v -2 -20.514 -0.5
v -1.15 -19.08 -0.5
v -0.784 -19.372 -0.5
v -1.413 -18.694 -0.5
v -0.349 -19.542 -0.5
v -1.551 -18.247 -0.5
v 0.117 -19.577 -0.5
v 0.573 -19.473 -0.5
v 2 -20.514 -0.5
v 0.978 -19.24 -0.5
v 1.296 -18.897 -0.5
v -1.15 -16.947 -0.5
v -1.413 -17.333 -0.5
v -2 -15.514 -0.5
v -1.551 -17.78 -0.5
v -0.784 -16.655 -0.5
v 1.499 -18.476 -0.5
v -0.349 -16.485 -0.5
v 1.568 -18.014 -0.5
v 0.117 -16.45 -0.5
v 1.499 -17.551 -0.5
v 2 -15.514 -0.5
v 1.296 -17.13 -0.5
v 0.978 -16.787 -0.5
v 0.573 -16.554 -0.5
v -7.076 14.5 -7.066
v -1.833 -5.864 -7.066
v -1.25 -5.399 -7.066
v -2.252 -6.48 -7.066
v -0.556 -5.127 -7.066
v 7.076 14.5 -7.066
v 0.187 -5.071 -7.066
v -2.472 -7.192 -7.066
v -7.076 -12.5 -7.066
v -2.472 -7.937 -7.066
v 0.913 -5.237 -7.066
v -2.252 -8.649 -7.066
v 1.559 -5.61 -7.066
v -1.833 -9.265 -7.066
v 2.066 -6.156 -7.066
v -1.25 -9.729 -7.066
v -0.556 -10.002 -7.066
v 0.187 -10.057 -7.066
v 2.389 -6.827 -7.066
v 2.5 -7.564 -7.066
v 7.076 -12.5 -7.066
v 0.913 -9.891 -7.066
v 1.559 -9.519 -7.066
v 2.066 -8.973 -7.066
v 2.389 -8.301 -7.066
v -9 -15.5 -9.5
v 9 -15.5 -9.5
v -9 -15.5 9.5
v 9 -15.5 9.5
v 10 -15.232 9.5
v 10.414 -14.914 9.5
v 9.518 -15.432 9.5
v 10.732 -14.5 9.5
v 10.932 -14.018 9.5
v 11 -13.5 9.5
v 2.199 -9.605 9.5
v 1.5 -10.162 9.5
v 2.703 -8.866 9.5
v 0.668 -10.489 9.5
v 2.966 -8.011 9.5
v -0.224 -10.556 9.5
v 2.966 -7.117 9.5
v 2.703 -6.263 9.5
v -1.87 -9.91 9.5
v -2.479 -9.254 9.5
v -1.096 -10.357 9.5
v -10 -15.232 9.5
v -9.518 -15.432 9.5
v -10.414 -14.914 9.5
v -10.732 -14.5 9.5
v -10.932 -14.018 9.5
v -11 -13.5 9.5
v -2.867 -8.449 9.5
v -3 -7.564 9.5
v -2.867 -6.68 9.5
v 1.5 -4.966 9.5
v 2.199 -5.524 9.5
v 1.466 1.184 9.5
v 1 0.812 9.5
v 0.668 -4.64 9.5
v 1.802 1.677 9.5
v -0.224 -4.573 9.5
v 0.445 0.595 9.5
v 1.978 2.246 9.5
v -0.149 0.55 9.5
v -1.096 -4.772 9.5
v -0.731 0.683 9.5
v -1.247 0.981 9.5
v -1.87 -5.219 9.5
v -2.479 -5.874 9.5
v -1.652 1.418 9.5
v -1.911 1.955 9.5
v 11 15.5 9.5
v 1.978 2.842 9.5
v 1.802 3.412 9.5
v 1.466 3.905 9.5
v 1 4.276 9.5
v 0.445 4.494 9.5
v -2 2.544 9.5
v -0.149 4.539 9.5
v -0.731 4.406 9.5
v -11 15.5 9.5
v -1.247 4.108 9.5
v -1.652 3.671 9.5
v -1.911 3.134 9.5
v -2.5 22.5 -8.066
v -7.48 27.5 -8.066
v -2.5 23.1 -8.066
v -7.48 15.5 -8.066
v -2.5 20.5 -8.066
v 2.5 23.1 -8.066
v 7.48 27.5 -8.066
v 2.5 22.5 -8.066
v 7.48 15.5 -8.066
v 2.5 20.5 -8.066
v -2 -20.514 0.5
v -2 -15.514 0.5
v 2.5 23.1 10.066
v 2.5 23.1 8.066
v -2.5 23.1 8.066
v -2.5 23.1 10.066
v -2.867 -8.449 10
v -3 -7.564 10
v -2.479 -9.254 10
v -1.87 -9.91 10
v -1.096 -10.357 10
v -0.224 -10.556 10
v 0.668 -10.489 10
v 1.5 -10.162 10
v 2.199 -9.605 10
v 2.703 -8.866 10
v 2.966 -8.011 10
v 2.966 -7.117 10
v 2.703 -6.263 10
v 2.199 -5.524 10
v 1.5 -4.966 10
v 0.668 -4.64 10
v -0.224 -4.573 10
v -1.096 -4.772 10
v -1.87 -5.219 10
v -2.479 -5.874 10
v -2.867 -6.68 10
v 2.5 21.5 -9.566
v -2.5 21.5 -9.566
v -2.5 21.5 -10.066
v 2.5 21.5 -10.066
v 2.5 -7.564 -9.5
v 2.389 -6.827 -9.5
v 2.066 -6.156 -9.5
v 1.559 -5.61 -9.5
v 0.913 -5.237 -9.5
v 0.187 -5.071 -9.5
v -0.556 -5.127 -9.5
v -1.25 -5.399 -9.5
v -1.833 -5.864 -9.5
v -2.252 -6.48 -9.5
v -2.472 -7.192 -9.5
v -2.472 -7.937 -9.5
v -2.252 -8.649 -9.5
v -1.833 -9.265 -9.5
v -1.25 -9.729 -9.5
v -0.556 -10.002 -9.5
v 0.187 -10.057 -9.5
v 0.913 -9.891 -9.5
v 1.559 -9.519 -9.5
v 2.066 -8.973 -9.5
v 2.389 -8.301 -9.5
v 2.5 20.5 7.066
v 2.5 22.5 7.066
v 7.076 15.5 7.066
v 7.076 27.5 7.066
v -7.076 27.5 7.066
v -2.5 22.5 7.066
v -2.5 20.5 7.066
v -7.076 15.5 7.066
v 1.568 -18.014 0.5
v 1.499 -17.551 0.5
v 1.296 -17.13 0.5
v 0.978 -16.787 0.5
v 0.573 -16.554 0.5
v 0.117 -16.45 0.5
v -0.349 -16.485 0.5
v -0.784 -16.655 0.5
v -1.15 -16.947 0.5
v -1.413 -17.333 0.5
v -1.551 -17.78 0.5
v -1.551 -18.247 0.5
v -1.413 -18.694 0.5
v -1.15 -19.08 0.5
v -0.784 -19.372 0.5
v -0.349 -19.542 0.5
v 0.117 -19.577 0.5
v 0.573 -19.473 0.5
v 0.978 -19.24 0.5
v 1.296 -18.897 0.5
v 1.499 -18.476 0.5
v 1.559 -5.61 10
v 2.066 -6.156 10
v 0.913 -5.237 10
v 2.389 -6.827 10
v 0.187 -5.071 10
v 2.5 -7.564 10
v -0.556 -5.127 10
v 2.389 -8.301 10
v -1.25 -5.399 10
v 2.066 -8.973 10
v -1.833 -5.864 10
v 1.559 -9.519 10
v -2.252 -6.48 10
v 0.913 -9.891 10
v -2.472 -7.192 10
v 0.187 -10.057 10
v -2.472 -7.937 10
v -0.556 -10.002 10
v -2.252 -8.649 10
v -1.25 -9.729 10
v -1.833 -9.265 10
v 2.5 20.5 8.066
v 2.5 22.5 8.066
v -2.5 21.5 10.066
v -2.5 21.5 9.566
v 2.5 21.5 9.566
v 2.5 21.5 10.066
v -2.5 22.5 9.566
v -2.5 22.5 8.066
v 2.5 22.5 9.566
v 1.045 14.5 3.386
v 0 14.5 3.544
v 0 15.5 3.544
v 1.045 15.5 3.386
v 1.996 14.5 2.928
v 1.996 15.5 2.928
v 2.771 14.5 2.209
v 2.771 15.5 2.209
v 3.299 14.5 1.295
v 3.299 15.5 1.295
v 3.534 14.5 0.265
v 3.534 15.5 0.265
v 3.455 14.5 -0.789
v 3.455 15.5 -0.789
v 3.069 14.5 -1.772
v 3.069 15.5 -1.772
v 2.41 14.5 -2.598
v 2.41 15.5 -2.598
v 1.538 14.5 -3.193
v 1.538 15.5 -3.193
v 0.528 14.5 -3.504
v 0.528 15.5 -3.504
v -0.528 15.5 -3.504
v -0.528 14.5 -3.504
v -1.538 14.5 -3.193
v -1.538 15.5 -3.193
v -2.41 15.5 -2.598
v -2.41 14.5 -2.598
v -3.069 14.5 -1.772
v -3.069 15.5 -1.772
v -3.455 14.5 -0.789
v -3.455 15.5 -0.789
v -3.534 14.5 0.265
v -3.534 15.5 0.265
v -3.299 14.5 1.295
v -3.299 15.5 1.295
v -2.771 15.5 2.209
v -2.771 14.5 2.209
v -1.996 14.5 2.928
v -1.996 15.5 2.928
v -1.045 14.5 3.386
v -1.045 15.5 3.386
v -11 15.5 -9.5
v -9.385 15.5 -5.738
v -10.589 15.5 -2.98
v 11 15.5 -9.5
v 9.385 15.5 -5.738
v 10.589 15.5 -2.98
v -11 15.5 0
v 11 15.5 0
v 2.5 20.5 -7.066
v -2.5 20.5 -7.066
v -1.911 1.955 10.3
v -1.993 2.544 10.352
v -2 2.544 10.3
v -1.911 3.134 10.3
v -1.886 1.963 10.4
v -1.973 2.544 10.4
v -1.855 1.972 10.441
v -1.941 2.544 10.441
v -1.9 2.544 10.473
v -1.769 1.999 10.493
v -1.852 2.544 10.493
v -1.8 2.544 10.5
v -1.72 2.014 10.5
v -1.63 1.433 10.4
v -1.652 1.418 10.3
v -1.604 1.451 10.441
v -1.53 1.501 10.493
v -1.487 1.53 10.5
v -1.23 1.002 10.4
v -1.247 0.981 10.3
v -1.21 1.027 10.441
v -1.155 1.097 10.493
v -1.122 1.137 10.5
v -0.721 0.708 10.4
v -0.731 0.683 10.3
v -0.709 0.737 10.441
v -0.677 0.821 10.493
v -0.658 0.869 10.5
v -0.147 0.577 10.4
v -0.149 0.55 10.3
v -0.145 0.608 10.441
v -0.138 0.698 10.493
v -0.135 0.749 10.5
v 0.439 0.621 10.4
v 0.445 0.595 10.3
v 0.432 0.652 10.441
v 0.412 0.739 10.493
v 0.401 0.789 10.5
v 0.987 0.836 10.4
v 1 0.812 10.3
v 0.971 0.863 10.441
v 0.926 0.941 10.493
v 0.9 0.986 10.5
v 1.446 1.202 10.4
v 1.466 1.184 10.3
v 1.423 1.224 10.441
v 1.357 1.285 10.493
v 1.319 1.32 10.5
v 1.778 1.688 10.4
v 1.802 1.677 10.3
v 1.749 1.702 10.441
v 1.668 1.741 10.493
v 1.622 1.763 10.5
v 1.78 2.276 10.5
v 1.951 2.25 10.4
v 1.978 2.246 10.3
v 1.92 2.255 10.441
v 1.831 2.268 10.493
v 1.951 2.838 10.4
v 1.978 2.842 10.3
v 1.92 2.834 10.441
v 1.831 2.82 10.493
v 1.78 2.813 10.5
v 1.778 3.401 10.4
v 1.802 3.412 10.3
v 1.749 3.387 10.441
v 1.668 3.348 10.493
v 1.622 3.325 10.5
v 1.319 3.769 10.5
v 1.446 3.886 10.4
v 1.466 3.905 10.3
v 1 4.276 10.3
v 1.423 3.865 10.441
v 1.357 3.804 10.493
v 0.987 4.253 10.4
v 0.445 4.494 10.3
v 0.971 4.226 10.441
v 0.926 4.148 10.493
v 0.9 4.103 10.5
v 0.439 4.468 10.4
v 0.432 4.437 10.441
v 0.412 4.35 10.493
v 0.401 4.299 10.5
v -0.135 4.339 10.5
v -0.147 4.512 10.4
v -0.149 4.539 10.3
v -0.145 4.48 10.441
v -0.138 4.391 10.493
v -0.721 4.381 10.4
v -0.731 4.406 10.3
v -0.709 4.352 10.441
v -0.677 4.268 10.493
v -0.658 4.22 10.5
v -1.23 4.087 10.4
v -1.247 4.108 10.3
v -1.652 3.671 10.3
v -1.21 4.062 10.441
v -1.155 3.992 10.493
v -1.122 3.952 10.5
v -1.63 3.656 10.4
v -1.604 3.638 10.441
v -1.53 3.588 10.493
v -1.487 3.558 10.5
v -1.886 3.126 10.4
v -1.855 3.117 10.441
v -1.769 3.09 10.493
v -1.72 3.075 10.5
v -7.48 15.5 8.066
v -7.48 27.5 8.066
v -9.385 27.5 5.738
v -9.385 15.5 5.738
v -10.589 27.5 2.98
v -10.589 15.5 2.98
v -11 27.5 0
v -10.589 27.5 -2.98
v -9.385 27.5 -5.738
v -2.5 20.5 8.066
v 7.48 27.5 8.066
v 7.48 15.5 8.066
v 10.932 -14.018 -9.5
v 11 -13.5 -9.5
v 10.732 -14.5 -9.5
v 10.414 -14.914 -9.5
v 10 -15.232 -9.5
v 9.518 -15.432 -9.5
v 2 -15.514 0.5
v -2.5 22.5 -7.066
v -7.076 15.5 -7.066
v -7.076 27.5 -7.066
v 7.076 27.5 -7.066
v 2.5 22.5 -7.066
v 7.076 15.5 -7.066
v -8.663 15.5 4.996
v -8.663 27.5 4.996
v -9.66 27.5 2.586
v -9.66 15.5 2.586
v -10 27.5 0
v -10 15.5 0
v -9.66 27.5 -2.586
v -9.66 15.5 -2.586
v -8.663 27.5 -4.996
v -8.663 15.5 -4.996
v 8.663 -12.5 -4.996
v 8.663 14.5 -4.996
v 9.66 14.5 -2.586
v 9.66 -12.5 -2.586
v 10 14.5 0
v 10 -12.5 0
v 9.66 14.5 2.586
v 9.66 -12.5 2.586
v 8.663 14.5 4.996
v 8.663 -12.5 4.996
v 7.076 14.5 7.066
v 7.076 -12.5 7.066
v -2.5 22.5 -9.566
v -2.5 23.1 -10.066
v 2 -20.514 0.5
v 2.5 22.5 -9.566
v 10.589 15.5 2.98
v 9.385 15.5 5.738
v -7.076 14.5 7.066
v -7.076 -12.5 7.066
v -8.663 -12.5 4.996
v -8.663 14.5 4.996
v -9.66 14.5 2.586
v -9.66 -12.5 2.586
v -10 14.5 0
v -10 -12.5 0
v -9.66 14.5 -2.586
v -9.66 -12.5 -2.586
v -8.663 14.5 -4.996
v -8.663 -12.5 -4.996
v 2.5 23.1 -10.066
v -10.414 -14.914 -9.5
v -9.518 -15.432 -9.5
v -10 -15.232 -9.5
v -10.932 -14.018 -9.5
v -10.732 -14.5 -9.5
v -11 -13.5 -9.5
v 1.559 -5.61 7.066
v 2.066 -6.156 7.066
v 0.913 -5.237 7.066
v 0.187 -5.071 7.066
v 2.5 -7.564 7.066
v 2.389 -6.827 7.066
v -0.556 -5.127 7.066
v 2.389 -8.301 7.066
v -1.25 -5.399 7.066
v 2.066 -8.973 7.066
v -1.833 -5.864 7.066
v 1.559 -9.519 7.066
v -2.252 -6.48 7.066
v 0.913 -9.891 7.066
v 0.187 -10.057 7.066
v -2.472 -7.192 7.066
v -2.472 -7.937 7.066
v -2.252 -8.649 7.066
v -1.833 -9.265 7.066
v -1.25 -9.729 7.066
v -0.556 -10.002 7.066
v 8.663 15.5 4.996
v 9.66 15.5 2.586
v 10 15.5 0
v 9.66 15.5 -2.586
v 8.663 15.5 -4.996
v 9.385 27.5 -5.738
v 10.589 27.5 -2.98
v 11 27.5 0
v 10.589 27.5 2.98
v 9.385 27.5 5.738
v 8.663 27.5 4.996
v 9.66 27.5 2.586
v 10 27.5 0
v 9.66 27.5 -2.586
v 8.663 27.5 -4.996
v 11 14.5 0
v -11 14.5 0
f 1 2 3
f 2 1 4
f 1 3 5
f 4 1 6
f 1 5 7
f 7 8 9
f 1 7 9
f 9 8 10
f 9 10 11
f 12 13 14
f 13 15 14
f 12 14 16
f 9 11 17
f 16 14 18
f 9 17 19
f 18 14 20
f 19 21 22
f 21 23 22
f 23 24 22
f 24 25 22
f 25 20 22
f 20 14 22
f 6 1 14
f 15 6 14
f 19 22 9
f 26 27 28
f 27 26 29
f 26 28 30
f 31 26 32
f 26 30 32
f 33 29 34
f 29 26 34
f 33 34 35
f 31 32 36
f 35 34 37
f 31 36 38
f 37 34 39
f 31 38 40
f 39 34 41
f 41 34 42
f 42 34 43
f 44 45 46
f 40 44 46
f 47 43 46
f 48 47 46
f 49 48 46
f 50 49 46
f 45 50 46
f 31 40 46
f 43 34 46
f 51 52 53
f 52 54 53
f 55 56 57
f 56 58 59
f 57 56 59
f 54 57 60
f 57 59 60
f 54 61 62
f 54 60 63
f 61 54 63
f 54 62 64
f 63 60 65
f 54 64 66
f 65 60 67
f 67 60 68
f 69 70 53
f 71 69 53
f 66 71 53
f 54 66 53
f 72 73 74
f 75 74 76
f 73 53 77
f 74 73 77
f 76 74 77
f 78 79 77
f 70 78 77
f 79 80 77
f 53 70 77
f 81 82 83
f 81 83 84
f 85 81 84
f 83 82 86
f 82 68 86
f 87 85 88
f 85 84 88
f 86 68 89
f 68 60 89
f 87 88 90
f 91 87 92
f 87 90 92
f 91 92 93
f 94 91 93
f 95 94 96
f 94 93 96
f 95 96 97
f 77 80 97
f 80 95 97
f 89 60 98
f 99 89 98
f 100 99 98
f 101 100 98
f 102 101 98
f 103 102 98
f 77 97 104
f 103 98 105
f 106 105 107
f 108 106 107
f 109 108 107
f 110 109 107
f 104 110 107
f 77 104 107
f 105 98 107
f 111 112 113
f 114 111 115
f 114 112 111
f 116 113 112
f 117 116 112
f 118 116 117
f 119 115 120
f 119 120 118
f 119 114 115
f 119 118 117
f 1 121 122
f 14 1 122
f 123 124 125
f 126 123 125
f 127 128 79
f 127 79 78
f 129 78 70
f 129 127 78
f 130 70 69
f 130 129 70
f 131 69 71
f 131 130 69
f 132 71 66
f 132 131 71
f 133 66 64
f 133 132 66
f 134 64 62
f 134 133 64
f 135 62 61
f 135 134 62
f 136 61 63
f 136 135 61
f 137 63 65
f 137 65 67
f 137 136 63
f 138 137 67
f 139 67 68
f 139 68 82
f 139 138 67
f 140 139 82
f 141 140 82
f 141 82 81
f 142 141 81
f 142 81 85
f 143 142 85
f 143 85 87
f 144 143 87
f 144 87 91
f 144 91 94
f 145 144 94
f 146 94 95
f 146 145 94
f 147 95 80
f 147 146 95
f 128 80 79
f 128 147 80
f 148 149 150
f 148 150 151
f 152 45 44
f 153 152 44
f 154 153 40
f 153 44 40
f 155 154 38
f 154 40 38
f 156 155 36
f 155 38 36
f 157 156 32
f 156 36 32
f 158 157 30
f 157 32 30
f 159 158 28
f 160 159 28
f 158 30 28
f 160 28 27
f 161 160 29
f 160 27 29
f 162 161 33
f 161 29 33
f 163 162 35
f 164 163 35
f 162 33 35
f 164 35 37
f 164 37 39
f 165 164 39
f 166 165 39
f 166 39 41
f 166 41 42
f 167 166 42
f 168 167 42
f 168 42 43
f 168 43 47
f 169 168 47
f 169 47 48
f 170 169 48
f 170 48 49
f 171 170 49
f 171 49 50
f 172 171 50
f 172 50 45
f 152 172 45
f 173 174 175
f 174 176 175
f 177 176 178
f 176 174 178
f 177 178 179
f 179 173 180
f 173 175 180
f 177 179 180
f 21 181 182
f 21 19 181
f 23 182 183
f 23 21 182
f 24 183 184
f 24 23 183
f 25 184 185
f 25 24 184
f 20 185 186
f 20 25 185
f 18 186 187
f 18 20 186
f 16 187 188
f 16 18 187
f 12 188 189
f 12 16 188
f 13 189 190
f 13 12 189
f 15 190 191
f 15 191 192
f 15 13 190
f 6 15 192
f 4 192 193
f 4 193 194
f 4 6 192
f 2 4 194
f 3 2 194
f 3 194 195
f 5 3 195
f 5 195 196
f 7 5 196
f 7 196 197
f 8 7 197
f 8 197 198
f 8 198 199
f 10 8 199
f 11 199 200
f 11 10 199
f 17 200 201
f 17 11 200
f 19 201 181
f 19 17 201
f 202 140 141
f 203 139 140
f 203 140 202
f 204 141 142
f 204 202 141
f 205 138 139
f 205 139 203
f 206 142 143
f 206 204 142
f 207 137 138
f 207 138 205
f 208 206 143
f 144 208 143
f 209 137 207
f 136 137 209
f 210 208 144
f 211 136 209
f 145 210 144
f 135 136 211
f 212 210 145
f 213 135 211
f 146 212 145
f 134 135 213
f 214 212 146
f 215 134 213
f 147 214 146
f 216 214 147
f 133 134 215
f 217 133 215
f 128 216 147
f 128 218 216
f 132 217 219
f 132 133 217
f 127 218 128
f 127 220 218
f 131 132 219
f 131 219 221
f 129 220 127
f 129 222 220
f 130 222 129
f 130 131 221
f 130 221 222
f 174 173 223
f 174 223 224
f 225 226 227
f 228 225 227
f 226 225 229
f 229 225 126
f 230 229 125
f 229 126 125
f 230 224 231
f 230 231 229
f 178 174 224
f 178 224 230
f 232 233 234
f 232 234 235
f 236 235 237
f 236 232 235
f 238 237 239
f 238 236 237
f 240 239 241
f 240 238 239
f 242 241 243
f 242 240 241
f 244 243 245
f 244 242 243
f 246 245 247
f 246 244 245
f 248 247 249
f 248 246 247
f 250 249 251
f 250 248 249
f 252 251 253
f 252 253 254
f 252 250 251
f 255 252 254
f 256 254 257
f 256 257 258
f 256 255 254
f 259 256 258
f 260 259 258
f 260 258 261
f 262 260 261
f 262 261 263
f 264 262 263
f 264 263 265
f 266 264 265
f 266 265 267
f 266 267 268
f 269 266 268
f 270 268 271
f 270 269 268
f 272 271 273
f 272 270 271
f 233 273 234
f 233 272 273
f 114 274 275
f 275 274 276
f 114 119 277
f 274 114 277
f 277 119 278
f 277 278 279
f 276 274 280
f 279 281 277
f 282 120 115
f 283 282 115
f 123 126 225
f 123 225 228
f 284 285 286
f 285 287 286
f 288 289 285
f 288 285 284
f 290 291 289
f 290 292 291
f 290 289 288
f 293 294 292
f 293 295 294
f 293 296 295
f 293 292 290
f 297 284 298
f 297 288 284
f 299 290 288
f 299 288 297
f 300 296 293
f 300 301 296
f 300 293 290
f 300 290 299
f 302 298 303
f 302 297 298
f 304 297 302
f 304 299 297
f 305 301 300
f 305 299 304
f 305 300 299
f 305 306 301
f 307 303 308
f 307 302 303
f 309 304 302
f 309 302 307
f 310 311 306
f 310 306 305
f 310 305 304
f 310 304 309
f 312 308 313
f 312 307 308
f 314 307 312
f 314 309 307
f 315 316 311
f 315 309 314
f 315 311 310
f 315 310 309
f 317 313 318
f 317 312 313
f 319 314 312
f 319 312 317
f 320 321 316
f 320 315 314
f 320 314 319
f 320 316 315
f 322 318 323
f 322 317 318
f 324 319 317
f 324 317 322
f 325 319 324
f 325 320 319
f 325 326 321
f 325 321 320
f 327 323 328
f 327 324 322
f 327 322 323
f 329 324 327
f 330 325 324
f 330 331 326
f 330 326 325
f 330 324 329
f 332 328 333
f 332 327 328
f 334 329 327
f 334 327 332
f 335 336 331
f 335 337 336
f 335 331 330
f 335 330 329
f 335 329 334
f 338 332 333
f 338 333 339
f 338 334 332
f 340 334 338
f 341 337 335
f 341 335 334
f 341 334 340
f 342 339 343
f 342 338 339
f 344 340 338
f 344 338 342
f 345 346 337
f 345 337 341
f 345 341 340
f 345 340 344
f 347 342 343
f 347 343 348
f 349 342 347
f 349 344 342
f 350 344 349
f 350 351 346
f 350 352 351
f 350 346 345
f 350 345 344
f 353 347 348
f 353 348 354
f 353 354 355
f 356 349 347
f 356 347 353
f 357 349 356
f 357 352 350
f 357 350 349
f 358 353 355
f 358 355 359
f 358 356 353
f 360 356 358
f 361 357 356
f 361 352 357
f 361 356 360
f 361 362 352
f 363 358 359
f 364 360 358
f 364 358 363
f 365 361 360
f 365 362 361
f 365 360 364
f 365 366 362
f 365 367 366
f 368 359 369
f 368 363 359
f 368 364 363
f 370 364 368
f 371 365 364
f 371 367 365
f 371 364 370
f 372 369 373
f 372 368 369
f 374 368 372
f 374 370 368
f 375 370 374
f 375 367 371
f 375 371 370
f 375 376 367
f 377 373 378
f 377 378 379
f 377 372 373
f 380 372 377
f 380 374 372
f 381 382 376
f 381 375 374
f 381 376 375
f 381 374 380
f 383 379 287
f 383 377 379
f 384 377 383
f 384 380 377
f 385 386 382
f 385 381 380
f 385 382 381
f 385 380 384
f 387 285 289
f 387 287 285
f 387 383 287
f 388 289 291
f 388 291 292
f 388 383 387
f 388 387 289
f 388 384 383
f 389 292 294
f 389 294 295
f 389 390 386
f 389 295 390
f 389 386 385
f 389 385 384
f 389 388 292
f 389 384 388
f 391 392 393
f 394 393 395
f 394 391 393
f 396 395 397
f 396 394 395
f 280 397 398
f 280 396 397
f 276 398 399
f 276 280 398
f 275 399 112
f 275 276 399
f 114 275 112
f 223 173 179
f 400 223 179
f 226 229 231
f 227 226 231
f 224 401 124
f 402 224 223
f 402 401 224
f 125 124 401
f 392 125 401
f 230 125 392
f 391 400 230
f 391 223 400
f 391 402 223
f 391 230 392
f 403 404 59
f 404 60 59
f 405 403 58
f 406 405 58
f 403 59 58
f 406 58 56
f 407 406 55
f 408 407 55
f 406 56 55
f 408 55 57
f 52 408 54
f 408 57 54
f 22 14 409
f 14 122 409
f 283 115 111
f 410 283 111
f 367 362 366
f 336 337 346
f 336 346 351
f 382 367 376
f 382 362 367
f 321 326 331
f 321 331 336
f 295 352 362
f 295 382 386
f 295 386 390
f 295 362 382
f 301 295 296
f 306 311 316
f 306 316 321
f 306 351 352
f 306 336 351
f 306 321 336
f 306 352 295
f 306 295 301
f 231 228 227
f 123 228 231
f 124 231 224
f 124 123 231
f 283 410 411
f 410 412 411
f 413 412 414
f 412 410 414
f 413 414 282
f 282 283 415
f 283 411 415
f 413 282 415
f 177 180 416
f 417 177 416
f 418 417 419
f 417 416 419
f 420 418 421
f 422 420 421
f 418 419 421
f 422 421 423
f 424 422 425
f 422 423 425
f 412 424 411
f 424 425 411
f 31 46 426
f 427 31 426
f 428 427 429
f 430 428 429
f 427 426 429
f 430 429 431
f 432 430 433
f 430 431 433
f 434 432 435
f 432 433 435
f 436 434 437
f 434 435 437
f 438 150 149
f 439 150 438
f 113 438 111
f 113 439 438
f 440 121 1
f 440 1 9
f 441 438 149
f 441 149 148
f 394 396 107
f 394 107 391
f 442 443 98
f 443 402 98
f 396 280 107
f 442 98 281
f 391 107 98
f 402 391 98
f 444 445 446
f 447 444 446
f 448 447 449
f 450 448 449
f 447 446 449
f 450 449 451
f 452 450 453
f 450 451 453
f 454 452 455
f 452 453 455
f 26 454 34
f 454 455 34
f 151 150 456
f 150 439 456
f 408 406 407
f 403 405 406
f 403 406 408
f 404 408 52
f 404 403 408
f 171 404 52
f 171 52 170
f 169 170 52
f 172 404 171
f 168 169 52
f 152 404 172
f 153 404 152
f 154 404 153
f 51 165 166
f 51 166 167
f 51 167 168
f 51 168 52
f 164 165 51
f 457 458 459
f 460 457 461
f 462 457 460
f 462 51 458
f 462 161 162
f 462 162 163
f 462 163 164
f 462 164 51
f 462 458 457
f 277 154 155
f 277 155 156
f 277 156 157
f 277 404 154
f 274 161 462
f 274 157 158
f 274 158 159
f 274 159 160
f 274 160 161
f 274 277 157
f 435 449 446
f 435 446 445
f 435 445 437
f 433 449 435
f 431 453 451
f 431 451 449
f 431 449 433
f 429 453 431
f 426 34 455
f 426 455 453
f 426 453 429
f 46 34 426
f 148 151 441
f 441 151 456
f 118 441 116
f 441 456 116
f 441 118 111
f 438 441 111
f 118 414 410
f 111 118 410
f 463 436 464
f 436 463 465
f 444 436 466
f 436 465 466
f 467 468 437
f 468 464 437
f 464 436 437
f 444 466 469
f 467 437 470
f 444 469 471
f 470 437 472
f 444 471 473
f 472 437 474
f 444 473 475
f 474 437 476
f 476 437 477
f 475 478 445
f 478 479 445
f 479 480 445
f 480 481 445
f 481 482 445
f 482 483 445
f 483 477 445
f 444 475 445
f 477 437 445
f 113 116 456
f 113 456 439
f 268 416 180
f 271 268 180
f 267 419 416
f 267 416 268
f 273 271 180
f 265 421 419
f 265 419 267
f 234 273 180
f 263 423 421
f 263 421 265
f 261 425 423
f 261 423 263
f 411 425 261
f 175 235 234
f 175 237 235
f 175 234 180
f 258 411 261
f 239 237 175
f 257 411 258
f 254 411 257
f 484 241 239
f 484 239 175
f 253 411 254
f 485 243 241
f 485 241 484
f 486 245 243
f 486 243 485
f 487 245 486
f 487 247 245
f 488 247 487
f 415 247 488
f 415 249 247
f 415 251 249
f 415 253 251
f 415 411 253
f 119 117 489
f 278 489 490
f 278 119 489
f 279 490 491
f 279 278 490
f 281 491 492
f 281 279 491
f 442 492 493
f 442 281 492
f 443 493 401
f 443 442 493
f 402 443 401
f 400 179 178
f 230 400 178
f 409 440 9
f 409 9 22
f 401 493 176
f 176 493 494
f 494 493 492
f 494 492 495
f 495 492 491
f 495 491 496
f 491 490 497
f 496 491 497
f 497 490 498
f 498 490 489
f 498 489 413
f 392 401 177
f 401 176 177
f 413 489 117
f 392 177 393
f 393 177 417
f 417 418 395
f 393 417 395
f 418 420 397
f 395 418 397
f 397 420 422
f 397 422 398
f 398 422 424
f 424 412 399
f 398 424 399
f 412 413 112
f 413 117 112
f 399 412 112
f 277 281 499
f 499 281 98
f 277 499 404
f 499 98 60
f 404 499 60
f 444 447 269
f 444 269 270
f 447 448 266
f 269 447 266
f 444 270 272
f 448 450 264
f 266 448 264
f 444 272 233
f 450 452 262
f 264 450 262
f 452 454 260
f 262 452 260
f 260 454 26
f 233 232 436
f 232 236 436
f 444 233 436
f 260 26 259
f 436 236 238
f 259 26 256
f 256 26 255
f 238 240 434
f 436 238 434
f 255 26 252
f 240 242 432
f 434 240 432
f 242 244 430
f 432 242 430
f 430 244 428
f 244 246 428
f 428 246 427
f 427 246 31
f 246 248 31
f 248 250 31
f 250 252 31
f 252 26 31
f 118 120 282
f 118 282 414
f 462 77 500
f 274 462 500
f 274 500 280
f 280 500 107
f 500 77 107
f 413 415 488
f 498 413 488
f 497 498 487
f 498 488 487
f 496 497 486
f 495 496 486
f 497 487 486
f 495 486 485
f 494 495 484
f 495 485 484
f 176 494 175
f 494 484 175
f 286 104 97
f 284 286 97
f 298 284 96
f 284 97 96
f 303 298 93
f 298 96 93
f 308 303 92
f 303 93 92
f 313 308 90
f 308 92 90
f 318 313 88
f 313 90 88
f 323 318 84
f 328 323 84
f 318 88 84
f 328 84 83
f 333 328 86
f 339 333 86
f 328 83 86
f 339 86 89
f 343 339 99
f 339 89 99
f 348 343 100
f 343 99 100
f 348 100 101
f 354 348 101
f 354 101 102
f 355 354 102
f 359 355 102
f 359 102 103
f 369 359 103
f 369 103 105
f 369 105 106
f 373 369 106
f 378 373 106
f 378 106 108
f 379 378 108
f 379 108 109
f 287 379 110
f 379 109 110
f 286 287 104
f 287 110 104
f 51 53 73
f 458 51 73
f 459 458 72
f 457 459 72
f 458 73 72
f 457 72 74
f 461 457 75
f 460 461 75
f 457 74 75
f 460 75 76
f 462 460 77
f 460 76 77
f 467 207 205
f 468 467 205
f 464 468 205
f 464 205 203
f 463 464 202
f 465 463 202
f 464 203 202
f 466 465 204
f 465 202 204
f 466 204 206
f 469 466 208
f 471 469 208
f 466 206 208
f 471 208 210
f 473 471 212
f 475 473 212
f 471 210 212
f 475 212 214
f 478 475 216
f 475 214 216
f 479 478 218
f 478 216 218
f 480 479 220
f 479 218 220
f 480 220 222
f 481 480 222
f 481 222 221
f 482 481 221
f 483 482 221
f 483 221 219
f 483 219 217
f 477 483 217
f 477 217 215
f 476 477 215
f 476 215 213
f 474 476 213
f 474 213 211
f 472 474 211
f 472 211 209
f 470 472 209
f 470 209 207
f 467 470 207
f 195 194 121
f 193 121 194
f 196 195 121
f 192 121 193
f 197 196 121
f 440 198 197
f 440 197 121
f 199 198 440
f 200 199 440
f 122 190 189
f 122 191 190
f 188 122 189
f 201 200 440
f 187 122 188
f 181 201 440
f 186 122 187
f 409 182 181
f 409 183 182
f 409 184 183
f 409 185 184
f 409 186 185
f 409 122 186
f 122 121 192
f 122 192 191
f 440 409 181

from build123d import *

# Parameters (mm, degrees)
BOSS_EXTRUDE1_DEPTH = 9.5
SKETCH3_W           = 4
SKETCH3_H           = 5
SKETCH3_R           = 1.568232158
BOSS_EXTRUDE2_DEPTH = 0.5
BOSS_EXTRUDE3_DEPTH = 12
SKETCH5_W           = 5
SKETCH5_H           = 2
CUT_EXTRUDE1_DEPTH  = 35.435518568
SKETCH6_R           = 2.5
CUT_EXTRUDE2_DEPTH  = 36.18877662
BOSS_EXTRUDE4_START = 0.5
SKETCH7_R           = 3
SKETCH7_R_2         = 2.5
BOSS_EXTRUDE4_DEPTH = 0.5
SKETCH8_R           = 2
BOSS_EXTRUDE5_DEPTH = 1
FILLET1_R           = 0.2
CUT_EXTRUDE3_START  = -28
CUT_EXTRUDE3_DEPTH  = 28
BOSS_EXTRUDE6_START = -1
SKETCH10_R          = 3.543625457
BOSS_EXTRUDE6_DEPTH = 1
SKETCH11_W          = 5
SKETCH11_H          = 0.6
BOSS_EXTRUDE7_DEPTH = 2
SKETCH12_W          = 5
SKETCH12_H          = 0.5
BOSS_EXTRUDE8_DEPTH = 1


with BuildPart() as part:
    # Sketch2 → Boss-Extrude1 (new, symmetric)
    with BuildSketch(Plane.XY):
        with BuildLine():
            Line((-11, 15.5), (11, 15.5))
            Line((11, 15.5), (11, -13.5))
            ThreePointArc((11, -13.5), (10.414213562, -14.914213562), (9, -15.5))
            Line((9, -15.5), (-9, -15.5))
            ThreePointArc((-9, -15.5), (-10.414213562, -14.914213562), (-11, -13.5))
            Line((-11, -13.5), (-11, 15.5))
        make_face()
    extrude(amount=BOSS_EXTRUDE1_DEPTH, both=True)

    # Sketch4 → Boss-Extrude3 (add)
    with BuildSketch(Plane(origin=(0, 15.5, 0), x_dir=(1, 0, 0), z_dir=(0, 1, 0))):
        with BuildLine():
            Line((-7.479570046, 8.065731953), (7.479570046, 8.065731953))
            ThreePointArc((7.479570046, 8.065731953), (11, 0), (7.479570046, -8.065731953))
            Line((7.479570046, -8.065731953), (-7.479570046, -8.065731953))
            ThreePointArc((-7.479570046, -8.065731953), (-11, 0), (-7.479570046, 8.065731953))
        make_face()
        with BuildLine():
            Line((-7.076399648, 7.065731953), (7.076399648, 7.065731953))
            ThreePointArc((7.076399648, 7.065731953), (10, 0), (7.076399648, -7.065731953))
            Line((7.076399648, -7.065731953), (-7.076399648, -7.065731953))
            ThreePointArc((-7.076399648, -7.065731953), (-10, 0), (-7.076399648, 7.065731953))
        make_face(mode=Mode.SUBTRACT)
    extrude(amount=BOSS_EXTRUDE3_DEPTH)

    # Sketch5 → Cut-Extrude1 (cut, through all)
    with BuildSketch(Plane(origin=(0, 0, -8.065731953), x_dir=(-1, 0, 0), z_dir=(0, 0, -1))):
        with Locations((0, 21.5)):
            Rectangle(SKETCH5_W, SKETCH5_H)
    extrude(amount=-CUT_EXTRUDE1_DEPTH, mode=Mode.SUBTRACT)

    # Sketch6 → Cut-Extrude2 (cut, through all)
    with BuildSketch(Plane.XY.offset(9.5)):
        with Locations((0, -7.564295089)):
            Circle(SKETCH6_R)
    extrude(amount=-CUT_EXTRUDE2_DEPTH, mode=Mode.SUBTRACT)

    # Sketch7 → Boss-Extrude4 (add)
    with BuildSketch(Plane.XY.offset(9.5).offset(BOSS_EXTRUDE4_START)):
        with Locations(Location((0, -7.564295089, 0), (0, 0, 180))):
            Circle(SKETCH7_R)
        with Locations((0, -7.564295089)):
            Circle(SKETCH7_R_2, mode=Mode.SUBTRACT)
    extrude(amount=-BOSS_EXTRUDE4_DEPTH)

    # Sketch8 → Boss-Extrude5 (add)
    with BuildSketch(Plane.XY.offset(9.5)):
        with Locations(Location((0, 2.544370002, 0), (0, 0, 180))):
            Circle(SKETCH8_R)
    extrude(amount=BOSS_EXTRUDE5_DEPTH)

    # Fillet1
    fillet1_edges = [part.edges().sort_by_distance(p)[0] for p in [
        (2, 2.544370002, 10.5),
    ]]
    fillet(fillet1_edges, radius=FILLET1_R)

    # Sketch9 → Cut-Extrude3 (cut)
    with BuildSketch(Plane(origin=(0, 15.5, 0), x_dir=(1, 0, 0), z_dir=(0, 1, 0)).offset(CUT_EXTRUDE3_START)):
        with BuildLine():
            Line((7.076399648, 7.065731953), (-7.076399648, 7.065731953))
            ThreePointArc((-7.076399648, 7.065731953), (-10, 0), (-7.076399648, -7.065731953))
            Line((-7.076399648, -7.065731953), (7.076399648, -7.065731953))
            ThreePointArc((7.076399648, -7.065731953), (10, 0), (7.076399648, 7.065731953))
        make_face()
    extrude(amount=CUT_EXTRUDE3_DEPTH, mode=Mode.SUBTRACT)

    # Sketch10 → Boss-Extrude6 (add)
    with BuildSketch(Plane(origin=(0, 15.5, 0), x_dir=(1, 0, 0), z_dir=(0, 1, 0)).offset(BOSS_EXTRUDE6_START)):
        with BuildLine():
            Line((7.479570046, 8.065731953), (-7.479570046, 8.065731953))
            ThreePointArc((-7.479570046, 8.065731953), (-10.081549249, 4.400268713), (-11, 0))
            ThreePointArc((-11, 0), (-10.081549249, -4.400268713), (-7.479570046, -8.065731953))
            Line((-7.479570046, -8.065731953), (7.479570046, -8.065731953))
            ThreePointArc((7.479570046, -8.065731953), (10.081549249, -4.400268713), (11, 0))
            ThreePointArc((11, 0), (10.081549249, 4.400268713), (7.479570046, 8.065731953))
        make_face()
        with Locations(Location((0, 0, 0), (0, 0, 270))):
            Circle(SKETCH10_R, mode=Mode.SUBTRACT)
    extrude(amount=BOSS_EXTRUDE6_DEPTH)

    # Sketch11 → Boss-Extrude7 (add)
    with BuildSketch(Plane(origin=(0, 0, -8.065731953), x_dir=(-1, 0, 0), z_dir=(0, 0, -1))):
        with Locations((0, 22.8)):
            Rectangle(SKETCH11_W, SKETCH11_H)
    boss_extrude7 = extrude(amount=BOSS_EXTRUDE7_DEPTH)

    # Sketch12 → Boss-Extrude8 (add)
    with BuildSketch(Plane.XZ.offset(-22.5)):
        with Locations((0, -9.815731953)):
            Rectangle(SKETCH12_W, SKETCH12_H)
    boss_extrude8 = extrude(amount=BOSS_EXTRUDE8_DEPTH)

    # Mirror1: Boss-Extrude7, Boss-Extrude8 across plane
    add(boss_extrude7.mirror(Plane.XY))
    add(boss_extrude8.mirror(Plane.XY))


with BuildPart() as body_2:
    # Sketch3 → Boss-Extrude2 (new, symmetric)
    with BuildSketch(Plane.XY):
        with Locations((0, -18.013524238)):
            Rectangle(SKETCH3_W, SKETCH3_H)
        with Locations((0, -18.013524238)):
            Circle(SKETCH3_R, mode=Mode.SUBTRACT)
    extrude(amount=BOSS_EXTRUDE2_DEPTH, both=True)


solid = Compound([part.part, body_2.part])
